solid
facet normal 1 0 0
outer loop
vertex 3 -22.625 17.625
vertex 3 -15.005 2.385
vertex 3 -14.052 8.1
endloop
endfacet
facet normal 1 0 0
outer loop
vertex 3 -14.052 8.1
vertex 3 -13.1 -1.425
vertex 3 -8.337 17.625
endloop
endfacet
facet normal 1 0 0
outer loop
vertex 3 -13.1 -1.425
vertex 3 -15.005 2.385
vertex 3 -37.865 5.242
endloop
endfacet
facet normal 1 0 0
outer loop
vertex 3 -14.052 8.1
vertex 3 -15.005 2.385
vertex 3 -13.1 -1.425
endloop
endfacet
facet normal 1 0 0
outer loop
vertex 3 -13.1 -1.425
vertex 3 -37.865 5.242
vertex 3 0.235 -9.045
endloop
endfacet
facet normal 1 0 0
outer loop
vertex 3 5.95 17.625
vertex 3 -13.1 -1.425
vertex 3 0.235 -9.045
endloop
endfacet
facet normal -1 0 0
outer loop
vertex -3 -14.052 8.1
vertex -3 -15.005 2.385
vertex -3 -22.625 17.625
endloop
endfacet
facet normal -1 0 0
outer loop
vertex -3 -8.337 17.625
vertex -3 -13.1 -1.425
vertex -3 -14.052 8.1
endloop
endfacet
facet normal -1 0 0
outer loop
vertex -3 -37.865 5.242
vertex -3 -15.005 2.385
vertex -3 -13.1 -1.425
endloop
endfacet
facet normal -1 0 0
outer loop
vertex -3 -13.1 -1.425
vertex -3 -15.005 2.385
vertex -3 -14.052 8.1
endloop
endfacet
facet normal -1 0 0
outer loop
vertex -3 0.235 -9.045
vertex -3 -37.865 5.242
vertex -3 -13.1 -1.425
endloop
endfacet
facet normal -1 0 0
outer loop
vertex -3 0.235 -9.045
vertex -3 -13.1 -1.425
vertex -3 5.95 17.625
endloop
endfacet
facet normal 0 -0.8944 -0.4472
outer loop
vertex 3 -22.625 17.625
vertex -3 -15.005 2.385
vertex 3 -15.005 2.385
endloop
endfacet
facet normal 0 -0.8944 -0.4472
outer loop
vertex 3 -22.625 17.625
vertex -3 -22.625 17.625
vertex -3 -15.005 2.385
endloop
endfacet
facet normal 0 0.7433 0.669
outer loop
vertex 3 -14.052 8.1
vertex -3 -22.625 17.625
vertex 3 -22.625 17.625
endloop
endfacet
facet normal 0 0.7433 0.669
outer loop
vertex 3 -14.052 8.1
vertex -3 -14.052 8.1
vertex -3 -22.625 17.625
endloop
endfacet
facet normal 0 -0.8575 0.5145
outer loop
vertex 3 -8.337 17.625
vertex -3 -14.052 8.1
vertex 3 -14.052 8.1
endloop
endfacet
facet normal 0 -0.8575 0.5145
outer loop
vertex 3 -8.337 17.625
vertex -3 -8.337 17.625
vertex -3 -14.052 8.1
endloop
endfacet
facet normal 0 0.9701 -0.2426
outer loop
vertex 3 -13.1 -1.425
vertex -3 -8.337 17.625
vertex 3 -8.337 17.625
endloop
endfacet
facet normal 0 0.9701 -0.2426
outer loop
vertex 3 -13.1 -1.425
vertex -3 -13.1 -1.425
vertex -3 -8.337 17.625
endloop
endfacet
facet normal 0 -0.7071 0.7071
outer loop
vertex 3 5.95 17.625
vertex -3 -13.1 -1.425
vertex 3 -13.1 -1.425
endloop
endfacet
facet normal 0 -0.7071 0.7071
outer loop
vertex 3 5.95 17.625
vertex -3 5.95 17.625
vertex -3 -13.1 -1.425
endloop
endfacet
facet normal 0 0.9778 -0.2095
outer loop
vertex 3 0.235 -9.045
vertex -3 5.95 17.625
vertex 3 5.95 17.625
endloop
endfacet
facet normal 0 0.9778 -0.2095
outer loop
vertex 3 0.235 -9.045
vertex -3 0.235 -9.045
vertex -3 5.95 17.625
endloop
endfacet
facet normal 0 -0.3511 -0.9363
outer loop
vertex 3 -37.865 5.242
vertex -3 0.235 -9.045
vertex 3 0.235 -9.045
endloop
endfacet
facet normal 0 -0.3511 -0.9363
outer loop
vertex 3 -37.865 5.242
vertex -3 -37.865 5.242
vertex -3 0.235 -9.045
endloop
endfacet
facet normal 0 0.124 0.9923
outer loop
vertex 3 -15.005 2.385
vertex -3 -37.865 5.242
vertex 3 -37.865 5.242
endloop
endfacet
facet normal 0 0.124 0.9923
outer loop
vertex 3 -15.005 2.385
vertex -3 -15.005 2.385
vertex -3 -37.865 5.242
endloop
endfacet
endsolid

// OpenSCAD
rotate([0,-90,0]) linear_extrude(height=6,center=true){
    translate([-30, +25])
    polygon(
        points=[
            [20.955, -24.765],
            [47.625, -19.05],
            [28.575, -38.1],
            [47.625, -33.3375],
            [38.1, -39.0525],
            [47.625, -47.625],
            [32.385, -40.005],
            [35.2425, -62.865]
        ]
    );
}
